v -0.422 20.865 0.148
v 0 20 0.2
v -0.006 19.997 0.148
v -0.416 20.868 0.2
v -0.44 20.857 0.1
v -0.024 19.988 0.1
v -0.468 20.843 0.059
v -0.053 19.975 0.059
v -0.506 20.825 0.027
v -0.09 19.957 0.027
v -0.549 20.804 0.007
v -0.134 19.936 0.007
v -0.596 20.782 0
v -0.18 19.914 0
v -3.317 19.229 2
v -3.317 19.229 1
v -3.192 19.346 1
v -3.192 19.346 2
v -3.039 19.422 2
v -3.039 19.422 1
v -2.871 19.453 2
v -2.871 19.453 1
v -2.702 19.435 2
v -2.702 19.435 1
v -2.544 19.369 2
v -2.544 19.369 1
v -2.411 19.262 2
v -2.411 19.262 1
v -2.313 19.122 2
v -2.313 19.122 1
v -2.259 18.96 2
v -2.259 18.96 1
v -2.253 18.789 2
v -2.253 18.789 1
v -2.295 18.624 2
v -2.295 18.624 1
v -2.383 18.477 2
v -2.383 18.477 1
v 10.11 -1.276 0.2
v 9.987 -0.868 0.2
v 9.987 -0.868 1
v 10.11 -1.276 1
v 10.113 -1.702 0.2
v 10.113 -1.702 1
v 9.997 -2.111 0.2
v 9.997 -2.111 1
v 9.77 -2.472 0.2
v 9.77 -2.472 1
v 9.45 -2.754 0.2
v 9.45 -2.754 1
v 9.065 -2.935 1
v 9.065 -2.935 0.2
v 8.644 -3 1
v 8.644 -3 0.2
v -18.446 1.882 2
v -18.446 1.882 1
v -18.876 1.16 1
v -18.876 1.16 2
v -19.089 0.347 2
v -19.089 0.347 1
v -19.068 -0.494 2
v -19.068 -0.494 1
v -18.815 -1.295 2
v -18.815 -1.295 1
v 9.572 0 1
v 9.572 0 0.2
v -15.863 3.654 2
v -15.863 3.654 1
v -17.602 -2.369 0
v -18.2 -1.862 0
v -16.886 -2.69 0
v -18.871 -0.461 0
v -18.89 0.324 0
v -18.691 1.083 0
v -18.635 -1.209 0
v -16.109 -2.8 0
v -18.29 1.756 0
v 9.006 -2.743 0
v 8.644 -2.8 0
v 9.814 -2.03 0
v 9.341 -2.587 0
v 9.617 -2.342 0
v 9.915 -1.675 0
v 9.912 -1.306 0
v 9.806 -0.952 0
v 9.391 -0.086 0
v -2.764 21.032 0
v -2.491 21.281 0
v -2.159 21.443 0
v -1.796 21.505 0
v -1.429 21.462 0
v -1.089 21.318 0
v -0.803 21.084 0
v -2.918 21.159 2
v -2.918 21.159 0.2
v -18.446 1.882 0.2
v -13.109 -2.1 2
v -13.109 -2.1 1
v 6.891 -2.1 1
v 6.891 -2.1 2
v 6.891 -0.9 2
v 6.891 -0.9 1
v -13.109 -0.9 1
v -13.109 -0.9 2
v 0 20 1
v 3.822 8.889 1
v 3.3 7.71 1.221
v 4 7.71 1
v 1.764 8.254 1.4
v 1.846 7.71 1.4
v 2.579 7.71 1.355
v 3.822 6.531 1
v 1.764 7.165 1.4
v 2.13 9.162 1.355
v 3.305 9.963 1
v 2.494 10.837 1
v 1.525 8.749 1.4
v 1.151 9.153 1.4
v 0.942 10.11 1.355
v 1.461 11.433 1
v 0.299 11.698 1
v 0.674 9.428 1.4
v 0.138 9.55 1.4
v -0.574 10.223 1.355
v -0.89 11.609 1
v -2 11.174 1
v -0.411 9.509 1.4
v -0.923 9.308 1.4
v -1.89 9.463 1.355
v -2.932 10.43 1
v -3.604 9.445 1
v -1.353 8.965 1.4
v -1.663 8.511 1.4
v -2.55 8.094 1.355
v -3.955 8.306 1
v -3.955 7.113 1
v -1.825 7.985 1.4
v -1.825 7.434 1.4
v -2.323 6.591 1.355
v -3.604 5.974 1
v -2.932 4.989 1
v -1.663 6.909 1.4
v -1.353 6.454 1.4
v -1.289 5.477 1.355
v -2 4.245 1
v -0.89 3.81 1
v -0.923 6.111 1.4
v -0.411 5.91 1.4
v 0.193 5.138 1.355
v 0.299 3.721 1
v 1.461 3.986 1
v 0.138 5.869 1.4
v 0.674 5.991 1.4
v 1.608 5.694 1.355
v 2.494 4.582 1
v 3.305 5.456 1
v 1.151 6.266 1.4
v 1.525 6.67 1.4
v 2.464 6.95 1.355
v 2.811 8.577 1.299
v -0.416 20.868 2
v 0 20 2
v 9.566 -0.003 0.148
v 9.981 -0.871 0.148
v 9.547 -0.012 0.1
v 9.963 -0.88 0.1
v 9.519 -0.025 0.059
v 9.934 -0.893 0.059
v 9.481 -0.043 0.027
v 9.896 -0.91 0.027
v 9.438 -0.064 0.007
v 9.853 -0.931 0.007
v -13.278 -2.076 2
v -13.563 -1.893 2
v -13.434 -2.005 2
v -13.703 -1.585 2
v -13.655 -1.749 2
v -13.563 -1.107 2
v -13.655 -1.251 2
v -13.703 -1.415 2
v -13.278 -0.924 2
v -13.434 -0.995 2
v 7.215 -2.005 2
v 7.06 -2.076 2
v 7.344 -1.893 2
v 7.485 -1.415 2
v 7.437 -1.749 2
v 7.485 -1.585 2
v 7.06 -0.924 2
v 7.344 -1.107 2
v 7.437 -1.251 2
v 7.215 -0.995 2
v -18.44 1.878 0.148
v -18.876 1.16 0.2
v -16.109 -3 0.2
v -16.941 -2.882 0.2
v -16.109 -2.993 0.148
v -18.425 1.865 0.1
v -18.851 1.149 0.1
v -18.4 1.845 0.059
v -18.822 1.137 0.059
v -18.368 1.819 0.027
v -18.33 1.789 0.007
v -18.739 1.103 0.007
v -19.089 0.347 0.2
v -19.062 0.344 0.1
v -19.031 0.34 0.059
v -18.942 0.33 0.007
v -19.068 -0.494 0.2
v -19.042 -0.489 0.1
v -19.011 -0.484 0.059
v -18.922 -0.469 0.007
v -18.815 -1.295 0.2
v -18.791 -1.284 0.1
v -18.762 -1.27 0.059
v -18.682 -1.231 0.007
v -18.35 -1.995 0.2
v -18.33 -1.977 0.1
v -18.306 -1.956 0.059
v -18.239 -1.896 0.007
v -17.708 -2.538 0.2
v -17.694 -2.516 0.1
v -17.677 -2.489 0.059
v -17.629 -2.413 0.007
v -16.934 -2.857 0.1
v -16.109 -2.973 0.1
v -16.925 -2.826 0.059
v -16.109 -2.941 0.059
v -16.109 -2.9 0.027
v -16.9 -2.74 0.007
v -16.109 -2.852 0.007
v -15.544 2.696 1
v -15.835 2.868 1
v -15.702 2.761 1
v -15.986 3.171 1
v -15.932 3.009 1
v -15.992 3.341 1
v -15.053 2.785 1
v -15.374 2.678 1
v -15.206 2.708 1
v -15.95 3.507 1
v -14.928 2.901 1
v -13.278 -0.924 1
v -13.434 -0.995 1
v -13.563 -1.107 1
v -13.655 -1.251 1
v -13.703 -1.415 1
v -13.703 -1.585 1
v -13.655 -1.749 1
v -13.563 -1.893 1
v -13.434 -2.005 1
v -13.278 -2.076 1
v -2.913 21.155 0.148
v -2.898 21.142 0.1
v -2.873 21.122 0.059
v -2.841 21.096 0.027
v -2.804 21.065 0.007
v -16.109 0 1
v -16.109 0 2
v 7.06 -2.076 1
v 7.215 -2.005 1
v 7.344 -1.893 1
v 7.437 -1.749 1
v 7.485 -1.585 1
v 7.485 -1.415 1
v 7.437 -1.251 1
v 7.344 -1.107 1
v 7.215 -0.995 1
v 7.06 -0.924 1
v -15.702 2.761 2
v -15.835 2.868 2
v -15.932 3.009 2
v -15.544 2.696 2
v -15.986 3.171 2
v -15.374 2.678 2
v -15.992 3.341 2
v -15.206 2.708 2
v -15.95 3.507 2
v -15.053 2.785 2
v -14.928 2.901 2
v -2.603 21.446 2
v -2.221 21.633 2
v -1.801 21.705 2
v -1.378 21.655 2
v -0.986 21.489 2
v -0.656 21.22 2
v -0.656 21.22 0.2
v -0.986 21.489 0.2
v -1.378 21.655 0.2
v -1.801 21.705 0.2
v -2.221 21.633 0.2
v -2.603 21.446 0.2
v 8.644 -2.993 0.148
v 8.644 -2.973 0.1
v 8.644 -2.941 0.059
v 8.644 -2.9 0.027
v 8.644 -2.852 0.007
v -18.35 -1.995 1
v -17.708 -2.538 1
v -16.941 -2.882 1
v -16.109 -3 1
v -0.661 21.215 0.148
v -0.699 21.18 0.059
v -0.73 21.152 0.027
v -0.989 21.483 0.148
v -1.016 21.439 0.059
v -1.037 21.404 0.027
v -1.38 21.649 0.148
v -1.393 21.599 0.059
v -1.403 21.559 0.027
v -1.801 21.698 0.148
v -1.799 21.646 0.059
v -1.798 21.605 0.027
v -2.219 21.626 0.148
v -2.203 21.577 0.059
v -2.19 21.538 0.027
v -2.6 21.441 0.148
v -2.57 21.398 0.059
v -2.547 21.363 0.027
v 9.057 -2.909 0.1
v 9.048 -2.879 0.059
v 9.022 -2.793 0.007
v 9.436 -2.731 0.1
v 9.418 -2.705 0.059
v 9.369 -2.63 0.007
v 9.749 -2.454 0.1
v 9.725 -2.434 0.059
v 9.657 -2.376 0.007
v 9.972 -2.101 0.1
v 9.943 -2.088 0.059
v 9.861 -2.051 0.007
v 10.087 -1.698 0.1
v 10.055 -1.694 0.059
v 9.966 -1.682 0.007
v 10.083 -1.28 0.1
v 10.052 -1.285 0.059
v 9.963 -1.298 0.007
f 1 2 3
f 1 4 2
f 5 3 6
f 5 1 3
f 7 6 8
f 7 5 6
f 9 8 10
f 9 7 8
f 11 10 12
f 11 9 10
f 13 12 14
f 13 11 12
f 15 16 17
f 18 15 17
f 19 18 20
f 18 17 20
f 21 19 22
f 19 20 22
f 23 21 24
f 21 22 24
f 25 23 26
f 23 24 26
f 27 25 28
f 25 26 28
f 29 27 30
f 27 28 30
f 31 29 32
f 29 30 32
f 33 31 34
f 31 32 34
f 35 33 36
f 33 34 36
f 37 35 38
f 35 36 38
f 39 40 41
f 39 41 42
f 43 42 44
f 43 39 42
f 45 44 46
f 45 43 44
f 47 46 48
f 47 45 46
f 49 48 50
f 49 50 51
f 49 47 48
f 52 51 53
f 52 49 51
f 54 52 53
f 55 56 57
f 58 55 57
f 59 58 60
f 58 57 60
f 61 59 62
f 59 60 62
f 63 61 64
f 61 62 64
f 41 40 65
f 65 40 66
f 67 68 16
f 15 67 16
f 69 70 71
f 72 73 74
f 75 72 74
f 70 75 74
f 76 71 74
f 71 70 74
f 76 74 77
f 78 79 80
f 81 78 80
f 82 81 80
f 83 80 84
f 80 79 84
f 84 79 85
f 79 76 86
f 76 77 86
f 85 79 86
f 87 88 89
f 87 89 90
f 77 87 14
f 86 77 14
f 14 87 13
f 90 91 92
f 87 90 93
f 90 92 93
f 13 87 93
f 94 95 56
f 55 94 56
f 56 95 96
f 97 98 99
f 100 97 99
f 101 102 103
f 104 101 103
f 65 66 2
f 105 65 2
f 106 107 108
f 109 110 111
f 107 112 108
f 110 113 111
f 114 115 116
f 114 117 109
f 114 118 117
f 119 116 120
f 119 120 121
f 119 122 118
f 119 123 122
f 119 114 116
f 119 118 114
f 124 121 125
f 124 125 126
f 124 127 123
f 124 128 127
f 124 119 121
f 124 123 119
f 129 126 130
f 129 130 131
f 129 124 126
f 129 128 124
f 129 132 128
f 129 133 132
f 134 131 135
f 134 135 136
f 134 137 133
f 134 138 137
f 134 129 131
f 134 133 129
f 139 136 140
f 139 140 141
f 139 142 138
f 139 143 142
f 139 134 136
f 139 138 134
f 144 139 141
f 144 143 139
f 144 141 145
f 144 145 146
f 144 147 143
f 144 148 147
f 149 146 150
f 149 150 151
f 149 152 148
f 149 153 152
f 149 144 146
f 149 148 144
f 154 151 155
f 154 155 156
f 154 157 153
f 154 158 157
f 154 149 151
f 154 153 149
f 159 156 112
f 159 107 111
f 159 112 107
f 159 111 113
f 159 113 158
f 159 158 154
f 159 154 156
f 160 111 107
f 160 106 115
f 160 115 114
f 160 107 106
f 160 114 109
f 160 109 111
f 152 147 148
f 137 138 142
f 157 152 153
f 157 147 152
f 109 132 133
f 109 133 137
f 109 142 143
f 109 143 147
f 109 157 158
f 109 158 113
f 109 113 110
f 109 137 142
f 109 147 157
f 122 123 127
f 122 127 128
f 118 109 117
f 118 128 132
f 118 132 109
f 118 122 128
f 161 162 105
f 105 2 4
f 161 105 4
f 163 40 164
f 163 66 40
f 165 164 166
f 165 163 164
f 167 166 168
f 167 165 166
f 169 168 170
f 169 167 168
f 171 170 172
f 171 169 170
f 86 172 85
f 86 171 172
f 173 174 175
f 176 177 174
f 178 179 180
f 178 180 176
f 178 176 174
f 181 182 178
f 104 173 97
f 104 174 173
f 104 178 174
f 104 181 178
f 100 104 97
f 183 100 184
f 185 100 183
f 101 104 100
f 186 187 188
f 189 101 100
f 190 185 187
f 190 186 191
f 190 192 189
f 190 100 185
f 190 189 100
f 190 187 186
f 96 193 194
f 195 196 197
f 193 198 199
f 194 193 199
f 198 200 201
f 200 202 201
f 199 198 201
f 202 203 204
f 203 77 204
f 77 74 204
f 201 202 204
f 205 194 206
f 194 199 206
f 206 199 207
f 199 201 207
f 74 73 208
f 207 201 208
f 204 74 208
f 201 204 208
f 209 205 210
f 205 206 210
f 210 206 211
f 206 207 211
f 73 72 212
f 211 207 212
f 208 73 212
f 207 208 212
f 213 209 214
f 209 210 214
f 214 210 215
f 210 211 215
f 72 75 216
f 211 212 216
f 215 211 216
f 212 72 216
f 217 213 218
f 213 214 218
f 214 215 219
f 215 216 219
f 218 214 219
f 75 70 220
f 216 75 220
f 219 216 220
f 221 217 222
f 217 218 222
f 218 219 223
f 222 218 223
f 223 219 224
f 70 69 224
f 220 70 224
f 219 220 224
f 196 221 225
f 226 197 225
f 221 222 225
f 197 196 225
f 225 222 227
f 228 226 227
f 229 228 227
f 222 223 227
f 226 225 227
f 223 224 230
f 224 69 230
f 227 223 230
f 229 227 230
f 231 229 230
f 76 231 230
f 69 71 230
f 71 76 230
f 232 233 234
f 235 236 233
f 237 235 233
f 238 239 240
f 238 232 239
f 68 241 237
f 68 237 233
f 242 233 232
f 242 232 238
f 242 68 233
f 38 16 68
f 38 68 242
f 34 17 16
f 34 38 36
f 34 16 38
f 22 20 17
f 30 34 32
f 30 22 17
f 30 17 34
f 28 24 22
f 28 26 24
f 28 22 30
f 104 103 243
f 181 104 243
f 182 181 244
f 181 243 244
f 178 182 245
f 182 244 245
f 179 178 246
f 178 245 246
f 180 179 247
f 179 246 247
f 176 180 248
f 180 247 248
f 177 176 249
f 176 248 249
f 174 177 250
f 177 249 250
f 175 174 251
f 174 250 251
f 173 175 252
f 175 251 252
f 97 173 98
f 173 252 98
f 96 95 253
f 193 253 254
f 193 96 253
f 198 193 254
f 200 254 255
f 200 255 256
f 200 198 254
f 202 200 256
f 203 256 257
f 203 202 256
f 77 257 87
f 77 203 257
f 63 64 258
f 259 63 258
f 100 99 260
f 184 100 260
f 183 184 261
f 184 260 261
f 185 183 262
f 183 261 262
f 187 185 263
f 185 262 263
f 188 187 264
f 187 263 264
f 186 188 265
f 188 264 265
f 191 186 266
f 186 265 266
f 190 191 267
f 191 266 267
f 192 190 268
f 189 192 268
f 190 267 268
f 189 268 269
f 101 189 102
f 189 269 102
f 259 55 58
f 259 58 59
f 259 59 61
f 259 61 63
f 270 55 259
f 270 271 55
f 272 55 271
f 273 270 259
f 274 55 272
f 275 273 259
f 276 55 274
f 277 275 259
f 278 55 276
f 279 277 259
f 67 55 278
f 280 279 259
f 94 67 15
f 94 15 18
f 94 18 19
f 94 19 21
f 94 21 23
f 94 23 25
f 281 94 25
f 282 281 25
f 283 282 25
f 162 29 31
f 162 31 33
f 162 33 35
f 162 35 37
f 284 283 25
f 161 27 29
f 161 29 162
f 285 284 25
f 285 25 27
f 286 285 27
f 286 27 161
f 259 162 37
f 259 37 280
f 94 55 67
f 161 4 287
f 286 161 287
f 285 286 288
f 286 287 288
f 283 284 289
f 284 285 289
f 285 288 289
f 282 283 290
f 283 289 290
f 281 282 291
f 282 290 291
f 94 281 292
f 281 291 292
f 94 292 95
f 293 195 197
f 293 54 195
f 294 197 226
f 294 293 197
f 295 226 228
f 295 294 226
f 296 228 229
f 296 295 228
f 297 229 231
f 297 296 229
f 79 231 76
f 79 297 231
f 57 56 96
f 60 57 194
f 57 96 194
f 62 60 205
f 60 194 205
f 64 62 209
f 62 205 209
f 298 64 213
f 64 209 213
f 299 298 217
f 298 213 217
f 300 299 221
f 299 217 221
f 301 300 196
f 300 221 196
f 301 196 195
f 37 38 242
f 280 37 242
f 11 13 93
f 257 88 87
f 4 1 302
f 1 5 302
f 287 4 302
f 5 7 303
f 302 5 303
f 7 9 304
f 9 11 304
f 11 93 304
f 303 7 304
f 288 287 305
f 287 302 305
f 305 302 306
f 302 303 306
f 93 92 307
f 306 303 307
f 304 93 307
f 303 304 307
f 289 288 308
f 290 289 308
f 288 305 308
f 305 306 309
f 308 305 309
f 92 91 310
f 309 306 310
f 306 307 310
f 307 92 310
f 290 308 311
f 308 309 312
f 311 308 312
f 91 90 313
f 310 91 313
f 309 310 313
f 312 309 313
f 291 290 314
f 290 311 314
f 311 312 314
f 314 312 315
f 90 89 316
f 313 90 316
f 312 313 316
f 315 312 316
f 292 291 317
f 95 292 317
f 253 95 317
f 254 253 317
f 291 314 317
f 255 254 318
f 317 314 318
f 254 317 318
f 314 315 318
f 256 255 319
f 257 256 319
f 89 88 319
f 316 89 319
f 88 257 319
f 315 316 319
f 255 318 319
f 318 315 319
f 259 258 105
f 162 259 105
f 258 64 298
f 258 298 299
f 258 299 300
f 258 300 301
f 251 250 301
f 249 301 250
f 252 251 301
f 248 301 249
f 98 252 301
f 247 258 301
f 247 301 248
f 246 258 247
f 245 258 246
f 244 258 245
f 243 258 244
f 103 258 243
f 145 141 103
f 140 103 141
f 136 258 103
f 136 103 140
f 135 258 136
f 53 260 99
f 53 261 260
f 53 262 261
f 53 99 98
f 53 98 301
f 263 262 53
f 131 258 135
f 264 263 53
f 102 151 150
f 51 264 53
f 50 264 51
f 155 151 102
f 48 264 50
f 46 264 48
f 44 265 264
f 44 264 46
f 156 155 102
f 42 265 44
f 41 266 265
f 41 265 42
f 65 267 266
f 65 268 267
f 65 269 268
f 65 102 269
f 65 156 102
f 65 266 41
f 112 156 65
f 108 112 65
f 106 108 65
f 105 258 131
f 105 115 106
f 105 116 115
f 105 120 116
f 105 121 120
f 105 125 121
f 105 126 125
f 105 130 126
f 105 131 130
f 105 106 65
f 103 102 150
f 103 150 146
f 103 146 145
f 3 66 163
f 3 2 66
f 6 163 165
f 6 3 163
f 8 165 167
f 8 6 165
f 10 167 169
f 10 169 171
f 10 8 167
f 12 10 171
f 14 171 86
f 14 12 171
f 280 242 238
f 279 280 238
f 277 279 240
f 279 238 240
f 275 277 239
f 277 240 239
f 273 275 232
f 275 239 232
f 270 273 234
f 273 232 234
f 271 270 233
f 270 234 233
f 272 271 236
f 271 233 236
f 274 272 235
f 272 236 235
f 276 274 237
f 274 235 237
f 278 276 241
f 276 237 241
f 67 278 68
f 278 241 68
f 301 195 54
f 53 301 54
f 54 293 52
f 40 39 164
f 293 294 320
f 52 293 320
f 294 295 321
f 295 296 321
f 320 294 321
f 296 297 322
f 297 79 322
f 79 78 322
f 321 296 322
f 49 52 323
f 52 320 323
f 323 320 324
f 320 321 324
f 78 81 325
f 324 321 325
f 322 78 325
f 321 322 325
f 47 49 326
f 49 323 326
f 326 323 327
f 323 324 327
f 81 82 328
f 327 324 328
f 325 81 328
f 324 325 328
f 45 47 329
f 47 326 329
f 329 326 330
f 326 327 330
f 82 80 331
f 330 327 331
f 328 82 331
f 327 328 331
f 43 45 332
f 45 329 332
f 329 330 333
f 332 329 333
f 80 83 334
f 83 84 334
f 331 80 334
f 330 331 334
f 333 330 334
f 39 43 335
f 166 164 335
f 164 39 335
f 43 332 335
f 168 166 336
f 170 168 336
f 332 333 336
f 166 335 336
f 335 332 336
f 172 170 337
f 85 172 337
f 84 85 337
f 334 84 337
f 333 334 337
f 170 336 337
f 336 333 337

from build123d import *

# Parameters (mm, degrees)
F2_DEPTH    = 1
F4_DEPTH    = 1
F5_T1_DEPTH = 13.9032439889
F5_T3_DEPTH = 12.9032439889
F6_R        = 4
F7_DEPTH    = 0.4
F10_R       = 0.2


# Not quite as in the source:
# - a fillet or chamfer that OpenCascade refuses, or shapes differently, is made with other operations: its cross-section is extruded or revolved along the edge and cut away or added


with BuildPart() as f2:
    # F0 (on Top) → F2 (new body)
    with BuildSketch(Plane.XY):
        Polygon((0, 20), (-16.1091689951, 0), (9.5716667723, 0), align=None)
    extrude(amount=F2_DEPTH)



with BuildPart() as f2b:
    # F1 (on face) → F2, piece 2 (new body)
    with BuildSketch(Plane.XY):
        with BuildLine():
            Line((-1.4357500158, 23), (-18.4455415549, 1.8818510201))
            ThreePointArc((-18.4455415549, 1.8818510201), (-18.8152319157, -1.295076627), (-16.1091689951, -3))
            Line((-16.1091689951, -3), (11.0074167882, -3))
            Line((11.0074167882, -3), (9.5716667723, 0))
            Line((9.5716667723, 0), (-16.1091689951, 0))
            Line((-16.1091689951, 0), (0, 20))
            Line((0, 20), (-1.4357500158, 23))
        make_face()
    extrude(amount=F2_DEPTH)


with BuildPart() as f2_1:
    add(f2.part)

    add(f2b.part)  # F4 merges F2b
    # F3 (on face) → F4 (join)
    with BuildSketch(Plane.XY.offset(1)):
        with BuildLine():
            Line((-18.8152319157, -1.295076627), (-16.1091689951, 0))
            Line((-16.1091689951, 0), (0, 20))
            Line((0, 20), (-1.4357500158, 23))
            Line((-1.4357500158, 23), (-18.4455415549, 1.8818510201))
            ThreePointArc((-18.4455415549, 1.8818510201), (-19.0890609751, 0.3467618604), (-18.8152319157, -1.295076627))
        make_face()
        with BuildLine():
            ThreePointArc((-14.928229743, 2.9009278658), (-15.771874459, 2.8100235579), (-15.8627787669, 3.6536682739))
            Line((-15.8627787669, 3.6536682739), (-3.3171052997, 19.2294853393))
            ThreePointArc((-3.3171052997, 19.2294853393), (-2.4734605837, 19.3203896472), (-2.3825562758, 18.4767449312))
            Line((-2.3825562758, 18.4767449312), (-14.928229743, 2.9009278658))
        make_face(mode=Mode.SUBTRACT)
        with BuildLine():
            Line((6.8908310049, -0.9), (-13.1091689951, -0.9))
            ThreePointArc((-13.1091689951, -0.9), (-13.7091689951, -1.5), (-13.1091689951, -2.1))
            Line((-13.1091689951, -2.1), (6.8908310049, -2.1))
            ThreePointArc((6.8908310049, -2.1), (7.4908310049, -1.5), (6.8908310049, -0.9))
        make_face()
    extrude(amount=F4_DEPTH)

    # F5: fillet of radius 1.5 on 2 edges, made by hand

    # F5_s2 → F5_t1 (cut)
    with BuildSketch(Plane.XY.offset(-5.9516219944)):
        with BuildLine():
            ThreePointArc((-0.4079522763, 20.8526480249), (-1.5876028064, 21.6950557014), (-2.9291700165, 21.1460352214))
            Line((-2.9291700165, 21.1460352214), (-2.9525337421, 21.1648537316))
            ThreePointArc((-2.9525337421, 21.1648537316), (-2.2057848022, 22.0918047567), (-1.4591137414, 23.0188185102))
            Line((-1.4591137414, 23.0188185102), (-1.4086893866, 23.0129507663))
            ThreePointArc((-1.4086893866, 23.0129507663), (-0.8948356179, 21.9392531941), (-0.3808916471, 20.8655987912))
            Line((-0.3808916471, 20.8655987912), (-0.4079522763, 20.8526480249))
        make_face()
    extrude(amount=F5_T1_DEPTH, mode=Mode.SUBTRACT)

    # F5_s4 → F5_t3 (cut)
    with BuildSketch(Plane.XY.offset(-5.9516219944)):
        with BuildLine():
            ThreePointArc((9.9797994528, -0.8525616865), (9.8958833281, -2.2996913111), (8.6267679925, -3.0001))
            Line((8.6267679925, -3.0001), (8.6267679925, -3.0301))
            ThreePointArc((8.6267679925, -3.0301), (9.8170923903, -3.03), (11.0074167882, -3.03))
            Line((11.0074167882, -3.03), (11.0344774174, -2.9870492337))
            ThreePointArc((11.0344774174, -2.9870492337), (10.5206236486, -1.9133516616), (10.006860082, -0.8396109202))
            Line((10.006860082, -0.8396109202), (9.9797994528, -0.8525616865))
        make_face()
    extrude(amount=F5_T3_DEPTH, mode=Mode.SUBTRACT)

    # F6 (on face) → F7 (join)
    with BuildSketch(Plane.XY.offset(1)):
        with Locations((0, 7.70957988)):
            Circle(F6_R)
    extrude(amount=F7_DEPTH)

    # F8: fillet of radius 6 on 1 edges, made by hand

    # F8_s1 → F8_t2 (revolve, cut)
    with BuildSketch(Plane.XZ.offset(-7.70957988)):
        with BuildLine():
            ThreePointArc((4, 1), (2.9413791922, 1.2991524815), (1.8459340771, 1.4))
            Line((1.8459340771, 1.4), (4, 1.4))
            Line((4, 1.4), (4, 1))
        make_face()
    revolve(axis=Axis((0, 7.70957988, 1.4), (0, 0, 1)), mode=Mode.SUBTRACT)

    # F9: union 

    # F10
    f10_edges = [f2_1.edges().sort_by_distance(p)[0] for p in [
        (4.785833, 10, 0),
        (-1.587603, 21.695056, 0),
        (-10.681885, 11.520656, 0),
        (-18.815232, -1.295077, 0),
        (-3.73254, -3, 0),
        (9.895883, -2.299691, 0),
    ]]
    fillet(f10_edges, radius=F10_R)


solid = f2_1.part
